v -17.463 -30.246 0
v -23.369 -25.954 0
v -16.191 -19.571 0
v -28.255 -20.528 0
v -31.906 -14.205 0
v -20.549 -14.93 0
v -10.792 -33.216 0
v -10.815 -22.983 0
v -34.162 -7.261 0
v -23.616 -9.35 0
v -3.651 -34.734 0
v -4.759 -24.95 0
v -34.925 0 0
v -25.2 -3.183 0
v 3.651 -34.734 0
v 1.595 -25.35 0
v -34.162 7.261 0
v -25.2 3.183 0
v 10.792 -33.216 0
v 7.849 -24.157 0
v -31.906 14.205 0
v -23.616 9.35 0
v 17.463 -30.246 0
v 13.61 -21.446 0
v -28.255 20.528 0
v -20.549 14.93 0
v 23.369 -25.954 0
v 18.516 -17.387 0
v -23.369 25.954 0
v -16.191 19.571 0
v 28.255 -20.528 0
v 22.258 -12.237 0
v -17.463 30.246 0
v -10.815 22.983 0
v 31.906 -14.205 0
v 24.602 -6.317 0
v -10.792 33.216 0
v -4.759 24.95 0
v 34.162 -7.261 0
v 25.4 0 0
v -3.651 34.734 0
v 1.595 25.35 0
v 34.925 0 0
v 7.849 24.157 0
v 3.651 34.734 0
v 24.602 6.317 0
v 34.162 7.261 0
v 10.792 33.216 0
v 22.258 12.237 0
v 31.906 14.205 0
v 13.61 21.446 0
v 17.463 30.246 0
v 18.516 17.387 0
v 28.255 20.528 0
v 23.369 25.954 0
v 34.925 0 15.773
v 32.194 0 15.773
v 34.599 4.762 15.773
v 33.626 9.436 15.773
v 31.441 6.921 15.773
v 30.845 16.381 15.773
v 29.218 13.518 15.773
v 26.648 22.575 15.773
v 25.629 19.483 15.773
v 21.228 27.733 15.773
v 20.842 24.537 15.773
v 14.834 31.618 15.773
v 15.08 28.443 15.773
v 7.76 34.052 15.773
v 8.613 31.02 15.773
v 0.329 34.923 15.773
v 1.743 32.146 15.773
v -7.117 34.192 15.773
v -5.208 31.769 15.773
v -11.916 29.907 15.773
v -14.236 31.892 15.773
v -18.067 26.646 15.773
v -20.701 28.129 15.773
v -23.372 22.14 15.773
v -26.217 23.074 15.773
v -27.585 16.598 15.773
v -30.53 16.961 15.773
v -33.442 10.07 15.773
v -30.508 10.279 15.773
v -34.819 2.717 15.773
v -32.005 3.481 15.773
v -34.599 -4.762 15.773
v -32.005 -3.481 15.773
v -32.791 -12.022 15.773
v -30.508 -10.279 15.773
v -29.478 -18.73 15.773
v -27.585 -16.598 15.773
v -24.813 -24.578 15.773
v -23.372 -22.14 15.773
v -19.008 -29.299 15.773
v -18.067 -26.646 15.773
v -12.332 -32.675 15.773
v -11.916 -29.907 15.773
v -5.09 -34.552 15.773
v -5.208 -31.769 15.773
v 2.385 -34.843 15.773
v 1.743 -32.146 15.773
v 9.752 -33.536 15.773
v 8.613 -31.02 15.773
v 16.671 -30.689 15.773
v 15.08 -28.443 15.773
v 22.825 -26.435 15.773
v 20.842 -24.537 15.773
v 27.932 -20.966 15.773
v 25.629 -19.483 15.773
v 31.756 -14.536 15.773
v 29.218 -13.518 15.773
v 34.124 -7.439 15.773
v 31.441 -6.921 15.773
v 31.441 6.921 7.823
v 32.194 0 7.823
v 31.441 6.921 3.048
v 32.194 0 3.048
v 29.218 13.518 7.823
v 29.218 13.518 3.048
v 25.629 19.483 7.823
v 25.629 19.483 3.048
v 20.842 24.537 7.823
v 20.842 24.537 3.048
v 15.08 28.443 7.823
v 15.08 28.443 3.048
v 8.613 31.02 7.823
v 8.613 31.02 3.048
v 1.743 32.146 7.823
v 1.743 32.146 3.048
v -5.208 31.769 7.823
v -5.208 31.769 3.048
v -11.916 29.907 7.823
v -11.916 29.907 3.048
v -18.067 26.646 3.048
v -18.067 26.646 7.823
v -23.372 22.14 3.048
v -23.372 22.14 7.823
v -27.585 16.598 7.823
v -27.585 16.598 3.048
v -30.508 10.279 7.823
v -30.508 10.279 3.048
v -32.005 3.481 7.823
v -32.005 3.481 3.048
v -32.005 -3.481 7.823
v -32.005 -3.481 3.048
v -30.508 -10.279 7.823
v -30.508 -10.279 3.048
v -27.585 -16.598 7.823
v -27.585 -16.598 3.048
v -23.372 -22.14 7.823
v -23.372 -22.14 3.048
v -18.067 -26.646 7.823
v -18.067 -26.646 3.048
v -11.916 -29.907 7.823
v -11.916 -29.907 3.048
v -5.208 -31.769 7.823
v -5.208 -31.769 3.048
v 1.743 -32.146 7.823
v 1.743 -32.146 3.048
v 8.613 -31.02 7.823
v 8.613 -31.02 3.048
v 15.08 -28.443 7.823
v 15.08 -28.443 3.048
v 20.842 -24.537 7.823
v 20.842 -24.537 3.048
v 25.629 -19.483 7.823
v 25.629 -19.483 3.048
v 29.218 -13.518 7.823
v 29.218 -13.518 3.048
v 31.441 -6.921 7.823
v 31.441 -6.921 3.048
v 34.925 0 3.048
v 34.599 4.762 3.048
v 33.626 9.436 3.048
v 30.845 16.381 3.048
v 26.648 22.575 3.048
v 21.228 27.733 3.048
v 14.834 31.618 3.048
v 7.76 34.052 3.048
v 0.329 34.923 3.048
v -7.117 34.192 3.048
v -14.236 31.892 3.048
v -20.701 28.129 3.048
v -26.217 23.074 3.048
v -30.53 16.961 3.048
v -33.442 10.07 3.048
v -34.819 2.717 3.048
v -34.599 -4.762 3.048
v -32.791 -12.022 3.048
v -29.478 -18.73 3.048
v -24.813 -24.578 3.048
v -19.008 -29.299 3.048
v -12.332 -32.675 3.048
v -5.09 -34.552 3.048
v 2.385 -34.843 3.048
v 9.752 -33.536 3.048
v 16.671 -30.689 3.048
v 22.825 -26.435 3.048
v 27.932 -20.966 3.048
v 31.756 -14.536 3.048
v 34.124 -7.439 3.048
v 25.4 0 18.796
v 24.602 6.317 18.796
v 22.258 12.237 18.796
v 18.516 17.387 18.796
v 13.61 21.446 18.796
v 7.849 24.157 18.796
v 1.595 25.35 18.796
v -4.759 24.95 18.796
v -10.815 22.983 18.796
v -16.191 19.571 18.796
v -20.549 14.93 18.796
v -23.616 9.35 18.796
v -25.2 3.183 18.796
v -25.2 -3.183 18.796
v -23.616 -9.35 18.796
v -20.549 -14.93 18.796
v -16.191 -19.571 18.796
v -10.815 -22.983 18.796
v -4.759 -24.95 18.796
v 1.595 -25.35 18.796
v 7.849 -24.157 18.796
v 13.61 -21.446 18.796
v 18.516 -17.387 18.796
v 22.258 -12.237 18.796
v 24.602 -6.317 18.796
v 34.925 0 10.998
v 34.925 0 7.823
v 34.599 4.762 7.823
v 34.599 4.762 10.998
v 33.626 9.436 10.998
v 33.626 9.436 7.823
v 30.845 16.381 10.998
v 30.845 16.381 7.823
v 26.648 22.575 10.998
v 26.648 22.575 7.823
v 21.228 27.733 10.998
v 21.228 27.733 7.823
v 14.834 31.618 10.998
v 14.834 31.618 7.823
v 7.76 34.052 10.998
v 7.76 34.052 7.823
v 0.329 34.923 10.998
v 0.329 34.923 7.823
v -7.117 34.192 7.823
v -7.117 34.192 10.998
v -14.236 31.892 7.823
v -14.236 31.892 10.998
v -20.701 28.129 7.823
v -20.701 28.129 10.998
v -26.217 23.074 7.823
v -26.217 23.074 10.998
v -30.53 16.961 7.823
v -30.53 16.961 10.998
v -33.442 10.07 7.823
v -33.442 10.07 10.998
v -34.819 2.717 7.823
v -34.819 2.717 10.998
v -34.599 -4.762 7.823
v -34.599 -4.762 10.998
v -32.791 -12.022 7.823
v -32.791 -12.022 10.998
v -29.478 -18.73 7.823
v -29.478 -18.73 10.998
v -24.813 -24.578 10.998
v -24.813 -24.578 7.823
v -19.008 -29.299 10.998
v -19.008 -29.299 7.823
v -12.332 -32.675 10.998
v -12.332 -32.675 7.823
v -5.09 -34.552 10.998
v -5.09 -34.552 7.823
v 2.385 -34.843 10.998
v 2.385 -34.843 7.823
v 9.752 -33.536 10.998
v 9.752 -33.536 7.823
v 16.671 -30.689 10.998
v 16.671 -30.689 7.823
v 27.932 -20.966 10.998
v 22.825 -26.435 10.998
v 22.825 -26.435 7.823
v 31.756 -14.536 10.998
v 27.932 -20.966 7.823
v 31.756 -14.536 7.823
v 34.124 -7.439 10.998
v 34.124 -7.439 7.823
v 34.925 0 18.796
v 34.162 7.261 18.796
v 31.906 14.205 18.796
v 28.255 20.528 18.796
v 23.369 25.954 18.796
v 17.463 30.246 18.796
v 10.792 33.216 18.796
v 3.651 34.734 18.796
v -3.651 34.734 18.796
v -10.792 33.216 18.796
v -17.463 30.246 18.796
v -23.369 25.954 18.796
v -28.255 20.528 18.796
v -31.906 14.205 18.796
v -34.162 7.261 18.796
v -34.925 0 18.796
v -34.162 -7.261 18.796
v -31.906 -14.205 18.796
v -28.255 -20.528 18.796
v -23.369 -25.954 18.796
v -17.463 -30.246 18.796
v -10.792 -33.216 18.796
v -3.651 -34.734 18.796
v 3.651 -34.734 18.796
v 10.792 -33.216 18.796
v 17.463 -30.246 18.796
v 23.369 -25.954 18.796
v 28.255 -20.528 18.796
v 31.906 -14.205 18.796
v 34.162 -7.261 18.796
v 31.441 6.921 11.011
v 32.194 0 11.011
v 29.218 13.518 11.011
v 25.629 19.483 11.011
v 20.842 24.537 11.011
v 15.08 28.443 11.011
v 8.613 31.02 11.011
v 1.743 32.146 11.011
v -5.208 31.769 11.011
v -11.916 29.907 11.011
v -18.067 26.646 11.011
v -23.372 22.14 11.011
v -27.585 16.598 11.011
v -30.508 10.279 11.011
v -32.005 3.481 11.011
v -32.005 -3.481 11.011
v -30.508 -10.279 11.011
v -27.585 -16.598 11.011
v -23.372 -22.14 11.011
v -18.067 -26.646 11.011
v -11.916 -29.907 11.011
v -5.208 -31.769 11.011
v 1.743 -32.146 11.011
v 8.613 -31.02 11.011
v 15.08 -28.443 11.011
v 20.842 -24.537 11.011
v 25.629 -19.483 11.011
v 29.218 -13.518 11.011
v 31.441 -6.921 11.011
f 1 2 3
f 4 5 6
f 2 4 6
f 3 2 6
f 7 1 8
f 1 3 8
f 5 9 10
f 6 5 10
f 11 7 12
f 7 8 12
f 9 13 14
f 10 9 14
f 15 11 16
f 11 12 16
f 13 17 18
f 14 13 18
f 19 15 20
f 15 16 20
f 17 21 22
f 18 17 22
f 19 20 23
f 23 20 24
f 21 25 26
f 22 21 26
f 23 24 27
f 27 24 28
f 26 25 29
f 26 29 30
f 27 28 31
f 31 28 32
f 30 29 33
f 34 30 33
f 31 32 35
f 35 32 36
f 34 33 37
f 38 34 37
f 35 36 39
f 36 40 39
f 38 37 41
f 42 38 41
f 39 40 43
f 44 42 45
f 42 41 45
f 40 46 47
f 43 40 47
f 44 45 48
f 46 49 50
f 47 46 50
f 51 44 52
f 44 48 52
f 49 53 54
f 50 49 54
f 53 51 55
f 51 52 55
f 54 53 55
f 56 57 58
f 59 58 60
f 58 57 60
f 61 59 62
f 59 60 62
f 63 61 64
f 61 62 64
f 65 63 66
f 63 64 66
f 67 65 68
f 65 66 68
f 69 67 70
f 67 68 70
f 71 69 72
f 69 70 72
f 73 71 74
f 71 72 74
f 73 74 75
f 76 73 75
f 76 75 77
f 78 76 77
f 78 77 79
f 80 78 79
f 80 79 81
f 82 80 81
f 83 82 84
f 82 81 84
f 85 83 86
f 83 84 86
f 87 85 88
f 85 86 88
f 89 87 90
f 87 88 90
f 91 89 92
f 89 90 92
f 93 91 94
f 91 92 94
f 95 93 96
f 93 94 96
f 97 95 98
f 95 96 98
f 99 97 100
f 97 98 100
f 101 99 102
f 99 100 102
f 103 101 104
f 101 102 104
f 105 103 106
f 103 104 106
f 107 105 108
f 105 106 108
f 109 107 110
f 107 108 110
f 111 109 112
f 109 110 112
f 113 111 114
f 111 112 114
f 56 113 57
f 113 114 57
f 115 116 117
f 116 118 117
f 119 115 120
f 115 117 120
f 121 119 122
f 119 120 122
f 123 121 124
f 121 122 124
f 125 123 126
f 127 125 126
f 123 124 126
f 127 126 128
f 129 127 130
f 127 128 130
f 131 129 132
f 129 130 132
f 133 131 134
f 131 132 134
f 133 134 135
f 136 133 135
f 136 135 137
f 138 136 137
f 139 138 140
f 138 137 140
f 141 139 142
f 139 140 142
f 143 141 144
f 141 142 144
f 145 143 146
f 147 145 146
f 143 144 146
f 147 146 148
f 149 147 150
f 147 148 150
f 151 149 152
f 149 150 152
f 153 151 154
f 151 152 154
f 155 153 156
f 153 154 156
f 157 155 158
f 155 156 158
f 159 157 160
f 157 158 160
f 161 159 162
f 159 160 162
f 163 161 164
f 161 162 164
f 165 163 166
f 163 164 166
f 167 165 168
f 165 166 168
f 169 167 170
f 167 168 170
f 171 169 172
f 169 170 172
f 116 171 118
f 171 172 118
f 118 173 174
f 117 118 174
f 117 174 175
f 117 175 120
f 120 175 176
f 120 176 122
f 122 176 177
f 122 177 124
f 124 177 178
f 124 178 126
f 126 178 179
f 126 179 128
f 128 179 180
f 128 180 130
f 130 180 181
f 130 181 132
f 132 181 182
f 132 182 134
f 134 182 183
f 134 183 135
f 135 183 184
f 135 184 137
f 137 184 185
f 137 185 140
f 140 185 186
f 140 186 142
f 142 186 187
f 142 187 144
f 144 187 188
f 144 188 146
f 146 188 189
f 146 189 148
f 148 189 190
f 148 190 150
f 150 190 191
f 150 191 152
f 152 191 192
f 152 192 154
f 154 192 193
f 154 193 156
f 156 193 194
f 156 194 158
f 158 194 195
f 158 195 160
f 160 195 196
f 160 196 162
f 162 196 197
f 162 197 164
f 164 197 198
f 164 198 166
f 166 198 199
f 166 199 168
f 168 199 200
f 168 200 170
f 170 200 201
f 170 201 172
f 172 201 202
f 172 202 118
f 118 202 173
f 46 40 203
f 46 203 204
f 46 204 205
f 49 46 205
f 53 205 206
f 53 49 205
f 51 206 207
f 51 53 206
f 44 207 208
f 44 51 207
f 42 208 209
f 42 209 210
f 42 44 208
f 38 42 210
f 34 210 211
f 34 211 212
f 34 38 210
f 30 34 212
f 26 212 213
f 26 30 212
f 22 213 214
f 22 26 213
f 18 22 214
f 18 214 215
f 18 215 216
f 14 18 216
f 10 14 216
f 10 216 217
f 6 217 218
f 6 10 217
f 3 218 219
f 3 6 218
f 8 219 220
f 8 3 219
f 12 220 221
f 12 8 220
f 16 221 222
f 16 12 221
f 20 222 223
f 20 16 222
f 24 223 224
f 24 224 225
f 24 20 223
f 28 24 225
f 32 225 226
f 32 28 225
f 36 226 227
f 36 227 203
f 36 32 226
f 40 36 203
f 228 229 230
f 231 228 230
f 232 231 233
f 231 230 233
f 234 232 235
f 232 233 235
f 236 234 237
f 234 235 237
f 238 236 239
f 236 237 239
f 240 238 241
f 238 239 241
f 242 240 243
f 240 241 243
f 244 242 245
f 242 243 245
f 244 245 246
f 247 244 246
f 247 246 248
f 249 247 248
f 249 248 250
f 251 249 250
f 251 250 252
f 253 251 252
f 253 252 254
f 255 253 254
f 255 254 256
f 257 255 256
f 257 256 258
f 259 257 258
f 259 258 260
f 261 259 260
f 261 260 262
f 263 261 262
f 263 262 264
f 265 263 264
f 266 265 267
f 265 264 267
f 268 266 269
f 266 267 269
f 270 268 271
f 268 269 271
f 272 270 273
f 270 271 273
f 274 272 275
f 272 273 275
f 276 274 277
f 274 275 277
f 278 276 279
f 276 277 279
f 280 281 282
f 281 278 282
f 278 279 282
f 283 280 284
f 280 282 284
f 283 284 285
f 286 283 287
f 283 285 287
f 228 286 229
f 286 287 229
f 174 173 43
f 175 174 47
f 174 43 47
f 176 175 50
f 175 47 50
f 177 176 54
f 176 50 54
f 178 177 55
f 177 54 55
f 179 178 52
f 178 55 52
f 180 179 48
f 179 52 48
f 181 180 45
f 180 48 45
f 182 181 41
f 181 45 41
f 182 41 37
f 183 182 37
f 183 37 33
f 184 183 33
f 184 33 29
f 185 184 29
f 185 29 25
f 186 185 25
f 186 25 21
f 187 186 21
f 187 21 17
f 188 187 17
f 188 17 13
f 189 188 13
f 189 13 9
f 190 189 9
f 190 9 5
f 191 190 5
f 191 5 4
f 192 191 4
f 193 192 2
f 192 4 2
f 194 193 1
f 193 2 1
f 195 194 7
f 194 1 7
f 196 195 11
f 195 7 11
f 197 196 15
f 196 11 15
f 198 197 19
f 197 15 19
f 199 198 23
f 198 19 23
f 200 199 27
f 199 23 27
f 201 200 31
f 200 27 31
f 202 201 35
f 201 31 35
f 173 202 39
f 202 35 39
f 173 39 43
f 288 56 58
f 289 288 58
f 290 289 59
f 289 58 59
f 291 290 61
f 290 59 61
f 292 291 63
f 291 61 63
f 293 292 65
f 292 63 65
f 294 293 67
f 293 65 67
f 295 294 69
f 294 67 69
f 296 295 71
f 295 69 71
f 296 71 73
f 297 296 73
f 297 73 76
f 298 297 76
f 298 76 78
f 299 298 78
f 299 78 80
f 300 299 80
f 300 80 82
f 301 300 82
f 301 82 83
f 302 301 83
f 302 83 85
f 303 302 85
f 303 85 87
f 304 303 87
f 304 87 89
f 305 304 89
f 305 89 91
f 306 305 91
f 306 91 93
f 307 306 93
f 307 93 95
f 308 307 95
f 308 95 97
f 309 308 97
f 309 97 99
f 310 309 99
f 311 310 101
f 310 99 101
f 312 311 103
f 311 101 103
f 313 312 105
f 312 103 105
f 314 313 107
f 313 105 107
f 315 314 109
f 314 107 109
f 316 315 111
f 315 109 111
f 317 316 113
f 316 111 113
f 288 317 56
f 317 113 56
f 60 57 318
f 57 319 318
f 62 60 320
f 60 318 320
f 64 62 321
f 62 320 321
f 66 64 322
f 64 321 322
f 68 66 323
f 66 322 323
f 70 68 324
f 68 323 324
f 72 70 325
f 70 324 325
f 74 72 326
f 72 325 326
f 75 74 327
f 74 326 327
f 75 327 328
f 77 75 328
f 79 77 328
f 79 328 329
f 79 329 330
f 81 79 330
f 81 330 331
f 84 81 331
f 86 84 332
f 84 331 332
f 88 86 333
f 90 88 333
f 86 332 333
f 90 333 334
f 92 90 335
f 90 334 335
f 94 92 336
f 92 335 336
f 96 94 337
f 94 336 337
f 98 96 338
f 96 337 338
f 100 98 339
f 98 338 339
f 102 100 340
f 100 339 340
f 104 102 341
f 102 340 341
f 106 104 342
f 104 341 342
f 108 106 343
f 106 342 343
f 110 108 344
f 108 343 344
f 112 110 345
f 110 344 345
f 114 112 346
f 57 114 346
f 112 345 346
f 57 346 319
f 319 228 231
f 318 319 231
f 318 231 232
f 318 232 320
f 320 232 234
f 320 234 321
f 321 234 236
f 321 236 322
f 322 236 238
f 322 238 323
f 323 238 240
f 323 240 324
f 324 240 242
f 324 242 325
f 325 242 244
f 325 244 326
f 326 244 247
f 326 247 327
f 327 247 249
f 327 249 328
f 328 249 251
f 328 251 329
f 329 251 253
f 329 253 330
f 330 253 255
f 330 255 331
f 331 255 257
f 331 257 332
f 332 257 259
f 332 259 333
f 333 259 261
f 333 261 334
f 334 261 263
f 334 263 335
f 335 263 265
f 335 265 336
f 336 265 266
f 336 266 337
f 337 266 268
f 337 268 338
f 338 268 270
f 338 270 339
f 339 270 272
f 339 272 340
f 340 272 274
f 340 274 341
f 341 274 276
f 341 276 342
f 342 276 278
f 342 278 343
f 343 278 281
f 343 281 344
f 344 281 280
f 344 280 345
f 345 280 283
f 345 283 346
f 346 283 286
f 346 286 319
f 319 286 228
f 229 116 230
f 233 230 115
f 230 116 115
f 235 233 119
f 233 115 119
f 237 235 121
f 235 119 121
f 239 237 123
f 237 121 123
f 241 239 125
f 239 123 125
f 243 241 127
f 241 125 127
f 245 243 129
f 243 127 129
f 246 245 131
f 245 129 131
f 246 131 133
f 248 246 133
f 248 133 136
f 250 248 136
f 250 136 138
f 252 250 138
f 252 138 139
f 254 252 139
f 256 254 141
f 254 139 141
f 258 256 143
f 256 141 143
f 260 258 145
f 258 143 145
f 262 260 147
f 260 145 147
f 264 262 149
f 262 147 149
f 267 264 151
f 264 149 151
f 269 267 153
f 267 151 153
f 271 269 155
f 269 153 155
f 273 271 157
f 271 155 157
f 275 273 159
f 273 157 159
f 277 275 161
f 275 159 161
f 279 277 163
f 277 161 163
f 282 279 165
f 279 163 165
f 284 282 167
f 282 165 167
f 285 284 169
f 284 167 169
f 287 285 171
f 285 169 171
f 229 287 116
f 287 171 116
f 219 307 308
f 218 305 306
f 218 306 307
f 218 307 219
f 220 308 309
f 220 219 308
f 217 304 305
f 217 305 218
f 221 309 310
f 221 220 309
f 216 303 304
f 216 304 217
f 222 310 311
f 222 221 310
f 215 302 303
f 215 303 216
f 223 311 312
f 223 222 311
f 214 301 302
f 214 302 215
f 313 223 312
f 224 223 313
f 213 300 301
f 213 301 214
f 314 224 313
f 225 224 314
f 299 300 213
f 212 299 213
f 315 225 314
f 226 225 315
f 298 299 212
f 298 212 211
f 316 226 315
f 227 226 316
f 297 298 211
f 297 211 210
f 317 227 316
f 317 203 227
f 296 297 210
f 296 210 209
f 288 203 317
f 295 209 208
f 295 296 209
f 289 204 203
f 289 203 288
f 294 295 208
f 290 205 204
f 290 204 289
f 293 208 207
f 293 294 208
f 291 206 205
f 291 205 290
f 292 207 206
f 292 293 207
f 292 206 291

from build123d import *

# Parameters (mm, degrees)
SKETCH1_R           = 34.925
SKETCH1_R_2         = 25.4
BOSS_EXTRUDE1_DEPTH = 18.796


with BuildPart() as part:
    # Sketch1 → Boss-Extrude1 (new body)
    with BuildSketch(Plane.XY):
        Circle(SKETCH1_R)
        Circle(SKETCH1_R_2, mode=Mode.SUBTRACT)
    extrude(amount=BOSS_EXTRUDE1_DEPTH)

    # Cut-Sweep1: sweep along a path in groove path
    with BuildLine(Plane.XY.offset(11.0109)) as cut_sweep1_path:
        CenterArc((0, 0), 34.925, 0, 360)
    # groove → Cut-Sweep1 (sweep, cut)
    with BuildSketch(Plane(origin=(0, 0, 0), x_dir=(0, 0, -1), z_dir=(1, 0, 0))):
        Polygon((-15.7734, 34.987595096), (-15.7734, 32.193595096), (-11.0109, 32.193595096), (-10.9982, 34.987595096), (-7.8232, 34.987595096), (-7.8232, 32.193595096), (-3.048, 32.193595096), (-3.048, 34.987595096), (-3.048, 38.125839406), (-15.7734, 38.125839406), align=None)
    sweep(path=cut_sweep1_path.line, mode=Mode.SUBTRACT)


solid = part.part
